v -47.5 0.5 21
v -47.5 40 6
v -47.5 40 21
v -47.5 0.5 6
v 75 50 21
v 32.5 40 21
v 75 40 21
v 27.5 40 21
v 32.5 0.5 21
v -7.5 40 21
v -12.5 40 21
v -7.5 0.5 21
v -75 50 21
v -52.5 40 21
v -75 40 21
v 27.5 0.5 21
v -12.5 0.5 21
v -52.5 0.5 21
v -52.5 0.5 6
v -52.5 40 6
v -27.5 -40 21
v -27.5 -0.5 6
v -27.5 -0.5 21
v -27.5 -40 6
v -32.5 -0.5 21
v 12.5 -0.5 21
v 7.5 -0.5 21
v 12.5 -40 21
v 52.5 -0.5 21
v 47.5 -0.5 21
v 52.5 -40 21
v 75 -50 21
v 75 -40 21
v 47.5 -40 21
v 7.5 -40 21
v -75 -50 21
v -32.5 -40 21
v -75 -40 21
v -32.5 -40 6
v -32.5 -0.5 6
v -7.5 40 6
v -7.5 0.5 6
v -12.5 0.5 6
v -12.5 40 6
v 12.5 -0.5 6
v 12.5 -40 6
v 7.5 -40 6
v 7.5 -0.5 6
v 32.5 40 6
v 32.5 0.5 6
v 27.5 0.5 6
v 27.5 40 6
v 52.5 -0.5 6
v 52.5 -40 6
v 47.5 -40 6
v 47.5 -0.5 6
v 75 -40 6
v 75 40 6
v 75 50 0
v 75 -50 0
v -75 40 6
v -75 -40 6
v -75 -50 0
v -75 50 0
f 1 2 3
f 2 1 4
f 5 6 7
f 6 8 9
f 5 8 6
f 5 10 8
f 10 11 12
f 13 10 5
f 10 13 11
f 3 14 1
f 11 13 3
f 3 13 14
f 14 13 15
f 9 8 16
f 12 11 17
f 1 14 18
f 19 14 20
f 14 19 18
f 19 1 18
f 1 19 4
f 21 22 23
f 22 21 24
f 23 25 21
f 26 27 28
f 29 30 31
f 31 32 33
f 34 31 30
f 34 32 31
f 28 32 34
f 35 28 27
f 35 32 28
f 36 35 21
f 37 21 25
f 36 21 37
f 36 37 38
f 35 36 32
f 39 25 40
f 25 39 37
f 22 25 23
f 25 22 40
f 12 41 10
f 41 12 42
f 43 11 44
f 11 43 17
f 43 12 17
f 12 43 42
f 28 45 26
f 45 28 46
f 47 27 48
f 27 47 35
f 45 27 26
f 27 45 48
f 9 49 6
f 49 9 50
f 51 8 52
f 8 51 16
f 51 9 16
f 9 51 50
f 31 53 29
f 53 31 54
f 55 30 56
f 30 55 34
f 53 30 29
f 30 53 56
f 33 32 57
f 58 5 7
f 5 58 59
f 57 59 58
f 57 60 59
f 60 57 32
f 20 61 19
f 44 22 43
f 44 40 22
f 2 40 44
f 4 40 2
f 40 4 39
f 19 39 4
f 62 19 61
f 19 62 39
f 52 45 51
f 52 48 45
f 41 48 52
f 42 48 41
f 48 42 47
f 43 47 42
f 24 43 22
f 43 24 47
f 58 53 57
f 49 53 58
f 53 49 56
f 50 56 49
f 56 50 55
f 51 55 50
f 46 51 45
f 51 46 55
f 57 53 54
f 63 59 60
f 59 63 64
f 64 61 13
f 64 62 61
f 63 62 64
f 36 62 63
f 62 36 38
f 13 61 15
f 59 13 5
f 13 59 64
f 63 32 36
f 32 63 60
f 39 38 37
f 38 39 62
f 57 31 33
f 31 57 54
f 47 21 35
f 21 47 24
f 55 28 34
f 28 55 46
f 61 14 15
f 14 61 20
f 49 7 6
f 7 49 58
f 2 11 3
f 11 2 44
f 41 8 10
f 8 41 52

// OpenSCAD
$fn = 32;

// ----------------------------------------------------------------------
// Rib frame 150 x 100 x 21
// 6 ribs at 20 mm pitch, staggered
// ----------------------------------------------------------------------

// --- parameters (mm) ---
frame = [150, 100, 6];  // base plate size (x, y, z)
rail_w = 10;            // side rail width
ribs = 6;               // number of ribs
rib_t = 5;              // rib thickness
rib_h = 15;             // rib height above the base plate
pitch = 20;             // pitch between rib centres

// --- derived feature positions (mm) ---
span = (ribs - 1) * pitch;          // = 100   distance between the outer ribs
origin_x = -span / 2;               // = -50   X of the first rib
rib_len = frame[1] / 2 - rail_w + 0.5;  // = 40.5   length of a staggered rib
rib_y = 0.5 + rib_len / 2;          // = 20.75   Y of a staggered rib centre
row_offset = 2 * rib_y;             // = 41.5   distance between the two rows
feature_centers = [
  [origin_x + 0 * pitch, rib_y],
  [origin_x + 1 * pitch, -rib_y],
  [origin_x + 2 * pitch, rib_y],
  [origin_x + 3 * pitch, -rib_y],
  [origin_x + 4 * pitch, rib_y],
  [origin_x + 5 * pitch, -rib_y]
];   // rib centre line, drives the rib loop

// base plate, two side rails, then the ribs read straight off feature_centers
union() {
  translate([-frame[0] / 2, -frame[1] / 2, 0]) cube(frame);
  translate([-frame[0] / 2, -frame[1] / 2, 0]) cube([frame[0], rail_w, frame[2] + rib_h]);
  translate([-frame[0] / 2, frame[1] / 2 - rail_w, 0]) cube([frame[0], rail_w, frame[2] + rib_h]);
  for (centre = feature_centers)
    translate([centre[0] - rib_t / 2, centre[1] - rib_len / 2, frame[2] - 1])
      cube([rib_t, rib_len, rib_h + 1]);
}
